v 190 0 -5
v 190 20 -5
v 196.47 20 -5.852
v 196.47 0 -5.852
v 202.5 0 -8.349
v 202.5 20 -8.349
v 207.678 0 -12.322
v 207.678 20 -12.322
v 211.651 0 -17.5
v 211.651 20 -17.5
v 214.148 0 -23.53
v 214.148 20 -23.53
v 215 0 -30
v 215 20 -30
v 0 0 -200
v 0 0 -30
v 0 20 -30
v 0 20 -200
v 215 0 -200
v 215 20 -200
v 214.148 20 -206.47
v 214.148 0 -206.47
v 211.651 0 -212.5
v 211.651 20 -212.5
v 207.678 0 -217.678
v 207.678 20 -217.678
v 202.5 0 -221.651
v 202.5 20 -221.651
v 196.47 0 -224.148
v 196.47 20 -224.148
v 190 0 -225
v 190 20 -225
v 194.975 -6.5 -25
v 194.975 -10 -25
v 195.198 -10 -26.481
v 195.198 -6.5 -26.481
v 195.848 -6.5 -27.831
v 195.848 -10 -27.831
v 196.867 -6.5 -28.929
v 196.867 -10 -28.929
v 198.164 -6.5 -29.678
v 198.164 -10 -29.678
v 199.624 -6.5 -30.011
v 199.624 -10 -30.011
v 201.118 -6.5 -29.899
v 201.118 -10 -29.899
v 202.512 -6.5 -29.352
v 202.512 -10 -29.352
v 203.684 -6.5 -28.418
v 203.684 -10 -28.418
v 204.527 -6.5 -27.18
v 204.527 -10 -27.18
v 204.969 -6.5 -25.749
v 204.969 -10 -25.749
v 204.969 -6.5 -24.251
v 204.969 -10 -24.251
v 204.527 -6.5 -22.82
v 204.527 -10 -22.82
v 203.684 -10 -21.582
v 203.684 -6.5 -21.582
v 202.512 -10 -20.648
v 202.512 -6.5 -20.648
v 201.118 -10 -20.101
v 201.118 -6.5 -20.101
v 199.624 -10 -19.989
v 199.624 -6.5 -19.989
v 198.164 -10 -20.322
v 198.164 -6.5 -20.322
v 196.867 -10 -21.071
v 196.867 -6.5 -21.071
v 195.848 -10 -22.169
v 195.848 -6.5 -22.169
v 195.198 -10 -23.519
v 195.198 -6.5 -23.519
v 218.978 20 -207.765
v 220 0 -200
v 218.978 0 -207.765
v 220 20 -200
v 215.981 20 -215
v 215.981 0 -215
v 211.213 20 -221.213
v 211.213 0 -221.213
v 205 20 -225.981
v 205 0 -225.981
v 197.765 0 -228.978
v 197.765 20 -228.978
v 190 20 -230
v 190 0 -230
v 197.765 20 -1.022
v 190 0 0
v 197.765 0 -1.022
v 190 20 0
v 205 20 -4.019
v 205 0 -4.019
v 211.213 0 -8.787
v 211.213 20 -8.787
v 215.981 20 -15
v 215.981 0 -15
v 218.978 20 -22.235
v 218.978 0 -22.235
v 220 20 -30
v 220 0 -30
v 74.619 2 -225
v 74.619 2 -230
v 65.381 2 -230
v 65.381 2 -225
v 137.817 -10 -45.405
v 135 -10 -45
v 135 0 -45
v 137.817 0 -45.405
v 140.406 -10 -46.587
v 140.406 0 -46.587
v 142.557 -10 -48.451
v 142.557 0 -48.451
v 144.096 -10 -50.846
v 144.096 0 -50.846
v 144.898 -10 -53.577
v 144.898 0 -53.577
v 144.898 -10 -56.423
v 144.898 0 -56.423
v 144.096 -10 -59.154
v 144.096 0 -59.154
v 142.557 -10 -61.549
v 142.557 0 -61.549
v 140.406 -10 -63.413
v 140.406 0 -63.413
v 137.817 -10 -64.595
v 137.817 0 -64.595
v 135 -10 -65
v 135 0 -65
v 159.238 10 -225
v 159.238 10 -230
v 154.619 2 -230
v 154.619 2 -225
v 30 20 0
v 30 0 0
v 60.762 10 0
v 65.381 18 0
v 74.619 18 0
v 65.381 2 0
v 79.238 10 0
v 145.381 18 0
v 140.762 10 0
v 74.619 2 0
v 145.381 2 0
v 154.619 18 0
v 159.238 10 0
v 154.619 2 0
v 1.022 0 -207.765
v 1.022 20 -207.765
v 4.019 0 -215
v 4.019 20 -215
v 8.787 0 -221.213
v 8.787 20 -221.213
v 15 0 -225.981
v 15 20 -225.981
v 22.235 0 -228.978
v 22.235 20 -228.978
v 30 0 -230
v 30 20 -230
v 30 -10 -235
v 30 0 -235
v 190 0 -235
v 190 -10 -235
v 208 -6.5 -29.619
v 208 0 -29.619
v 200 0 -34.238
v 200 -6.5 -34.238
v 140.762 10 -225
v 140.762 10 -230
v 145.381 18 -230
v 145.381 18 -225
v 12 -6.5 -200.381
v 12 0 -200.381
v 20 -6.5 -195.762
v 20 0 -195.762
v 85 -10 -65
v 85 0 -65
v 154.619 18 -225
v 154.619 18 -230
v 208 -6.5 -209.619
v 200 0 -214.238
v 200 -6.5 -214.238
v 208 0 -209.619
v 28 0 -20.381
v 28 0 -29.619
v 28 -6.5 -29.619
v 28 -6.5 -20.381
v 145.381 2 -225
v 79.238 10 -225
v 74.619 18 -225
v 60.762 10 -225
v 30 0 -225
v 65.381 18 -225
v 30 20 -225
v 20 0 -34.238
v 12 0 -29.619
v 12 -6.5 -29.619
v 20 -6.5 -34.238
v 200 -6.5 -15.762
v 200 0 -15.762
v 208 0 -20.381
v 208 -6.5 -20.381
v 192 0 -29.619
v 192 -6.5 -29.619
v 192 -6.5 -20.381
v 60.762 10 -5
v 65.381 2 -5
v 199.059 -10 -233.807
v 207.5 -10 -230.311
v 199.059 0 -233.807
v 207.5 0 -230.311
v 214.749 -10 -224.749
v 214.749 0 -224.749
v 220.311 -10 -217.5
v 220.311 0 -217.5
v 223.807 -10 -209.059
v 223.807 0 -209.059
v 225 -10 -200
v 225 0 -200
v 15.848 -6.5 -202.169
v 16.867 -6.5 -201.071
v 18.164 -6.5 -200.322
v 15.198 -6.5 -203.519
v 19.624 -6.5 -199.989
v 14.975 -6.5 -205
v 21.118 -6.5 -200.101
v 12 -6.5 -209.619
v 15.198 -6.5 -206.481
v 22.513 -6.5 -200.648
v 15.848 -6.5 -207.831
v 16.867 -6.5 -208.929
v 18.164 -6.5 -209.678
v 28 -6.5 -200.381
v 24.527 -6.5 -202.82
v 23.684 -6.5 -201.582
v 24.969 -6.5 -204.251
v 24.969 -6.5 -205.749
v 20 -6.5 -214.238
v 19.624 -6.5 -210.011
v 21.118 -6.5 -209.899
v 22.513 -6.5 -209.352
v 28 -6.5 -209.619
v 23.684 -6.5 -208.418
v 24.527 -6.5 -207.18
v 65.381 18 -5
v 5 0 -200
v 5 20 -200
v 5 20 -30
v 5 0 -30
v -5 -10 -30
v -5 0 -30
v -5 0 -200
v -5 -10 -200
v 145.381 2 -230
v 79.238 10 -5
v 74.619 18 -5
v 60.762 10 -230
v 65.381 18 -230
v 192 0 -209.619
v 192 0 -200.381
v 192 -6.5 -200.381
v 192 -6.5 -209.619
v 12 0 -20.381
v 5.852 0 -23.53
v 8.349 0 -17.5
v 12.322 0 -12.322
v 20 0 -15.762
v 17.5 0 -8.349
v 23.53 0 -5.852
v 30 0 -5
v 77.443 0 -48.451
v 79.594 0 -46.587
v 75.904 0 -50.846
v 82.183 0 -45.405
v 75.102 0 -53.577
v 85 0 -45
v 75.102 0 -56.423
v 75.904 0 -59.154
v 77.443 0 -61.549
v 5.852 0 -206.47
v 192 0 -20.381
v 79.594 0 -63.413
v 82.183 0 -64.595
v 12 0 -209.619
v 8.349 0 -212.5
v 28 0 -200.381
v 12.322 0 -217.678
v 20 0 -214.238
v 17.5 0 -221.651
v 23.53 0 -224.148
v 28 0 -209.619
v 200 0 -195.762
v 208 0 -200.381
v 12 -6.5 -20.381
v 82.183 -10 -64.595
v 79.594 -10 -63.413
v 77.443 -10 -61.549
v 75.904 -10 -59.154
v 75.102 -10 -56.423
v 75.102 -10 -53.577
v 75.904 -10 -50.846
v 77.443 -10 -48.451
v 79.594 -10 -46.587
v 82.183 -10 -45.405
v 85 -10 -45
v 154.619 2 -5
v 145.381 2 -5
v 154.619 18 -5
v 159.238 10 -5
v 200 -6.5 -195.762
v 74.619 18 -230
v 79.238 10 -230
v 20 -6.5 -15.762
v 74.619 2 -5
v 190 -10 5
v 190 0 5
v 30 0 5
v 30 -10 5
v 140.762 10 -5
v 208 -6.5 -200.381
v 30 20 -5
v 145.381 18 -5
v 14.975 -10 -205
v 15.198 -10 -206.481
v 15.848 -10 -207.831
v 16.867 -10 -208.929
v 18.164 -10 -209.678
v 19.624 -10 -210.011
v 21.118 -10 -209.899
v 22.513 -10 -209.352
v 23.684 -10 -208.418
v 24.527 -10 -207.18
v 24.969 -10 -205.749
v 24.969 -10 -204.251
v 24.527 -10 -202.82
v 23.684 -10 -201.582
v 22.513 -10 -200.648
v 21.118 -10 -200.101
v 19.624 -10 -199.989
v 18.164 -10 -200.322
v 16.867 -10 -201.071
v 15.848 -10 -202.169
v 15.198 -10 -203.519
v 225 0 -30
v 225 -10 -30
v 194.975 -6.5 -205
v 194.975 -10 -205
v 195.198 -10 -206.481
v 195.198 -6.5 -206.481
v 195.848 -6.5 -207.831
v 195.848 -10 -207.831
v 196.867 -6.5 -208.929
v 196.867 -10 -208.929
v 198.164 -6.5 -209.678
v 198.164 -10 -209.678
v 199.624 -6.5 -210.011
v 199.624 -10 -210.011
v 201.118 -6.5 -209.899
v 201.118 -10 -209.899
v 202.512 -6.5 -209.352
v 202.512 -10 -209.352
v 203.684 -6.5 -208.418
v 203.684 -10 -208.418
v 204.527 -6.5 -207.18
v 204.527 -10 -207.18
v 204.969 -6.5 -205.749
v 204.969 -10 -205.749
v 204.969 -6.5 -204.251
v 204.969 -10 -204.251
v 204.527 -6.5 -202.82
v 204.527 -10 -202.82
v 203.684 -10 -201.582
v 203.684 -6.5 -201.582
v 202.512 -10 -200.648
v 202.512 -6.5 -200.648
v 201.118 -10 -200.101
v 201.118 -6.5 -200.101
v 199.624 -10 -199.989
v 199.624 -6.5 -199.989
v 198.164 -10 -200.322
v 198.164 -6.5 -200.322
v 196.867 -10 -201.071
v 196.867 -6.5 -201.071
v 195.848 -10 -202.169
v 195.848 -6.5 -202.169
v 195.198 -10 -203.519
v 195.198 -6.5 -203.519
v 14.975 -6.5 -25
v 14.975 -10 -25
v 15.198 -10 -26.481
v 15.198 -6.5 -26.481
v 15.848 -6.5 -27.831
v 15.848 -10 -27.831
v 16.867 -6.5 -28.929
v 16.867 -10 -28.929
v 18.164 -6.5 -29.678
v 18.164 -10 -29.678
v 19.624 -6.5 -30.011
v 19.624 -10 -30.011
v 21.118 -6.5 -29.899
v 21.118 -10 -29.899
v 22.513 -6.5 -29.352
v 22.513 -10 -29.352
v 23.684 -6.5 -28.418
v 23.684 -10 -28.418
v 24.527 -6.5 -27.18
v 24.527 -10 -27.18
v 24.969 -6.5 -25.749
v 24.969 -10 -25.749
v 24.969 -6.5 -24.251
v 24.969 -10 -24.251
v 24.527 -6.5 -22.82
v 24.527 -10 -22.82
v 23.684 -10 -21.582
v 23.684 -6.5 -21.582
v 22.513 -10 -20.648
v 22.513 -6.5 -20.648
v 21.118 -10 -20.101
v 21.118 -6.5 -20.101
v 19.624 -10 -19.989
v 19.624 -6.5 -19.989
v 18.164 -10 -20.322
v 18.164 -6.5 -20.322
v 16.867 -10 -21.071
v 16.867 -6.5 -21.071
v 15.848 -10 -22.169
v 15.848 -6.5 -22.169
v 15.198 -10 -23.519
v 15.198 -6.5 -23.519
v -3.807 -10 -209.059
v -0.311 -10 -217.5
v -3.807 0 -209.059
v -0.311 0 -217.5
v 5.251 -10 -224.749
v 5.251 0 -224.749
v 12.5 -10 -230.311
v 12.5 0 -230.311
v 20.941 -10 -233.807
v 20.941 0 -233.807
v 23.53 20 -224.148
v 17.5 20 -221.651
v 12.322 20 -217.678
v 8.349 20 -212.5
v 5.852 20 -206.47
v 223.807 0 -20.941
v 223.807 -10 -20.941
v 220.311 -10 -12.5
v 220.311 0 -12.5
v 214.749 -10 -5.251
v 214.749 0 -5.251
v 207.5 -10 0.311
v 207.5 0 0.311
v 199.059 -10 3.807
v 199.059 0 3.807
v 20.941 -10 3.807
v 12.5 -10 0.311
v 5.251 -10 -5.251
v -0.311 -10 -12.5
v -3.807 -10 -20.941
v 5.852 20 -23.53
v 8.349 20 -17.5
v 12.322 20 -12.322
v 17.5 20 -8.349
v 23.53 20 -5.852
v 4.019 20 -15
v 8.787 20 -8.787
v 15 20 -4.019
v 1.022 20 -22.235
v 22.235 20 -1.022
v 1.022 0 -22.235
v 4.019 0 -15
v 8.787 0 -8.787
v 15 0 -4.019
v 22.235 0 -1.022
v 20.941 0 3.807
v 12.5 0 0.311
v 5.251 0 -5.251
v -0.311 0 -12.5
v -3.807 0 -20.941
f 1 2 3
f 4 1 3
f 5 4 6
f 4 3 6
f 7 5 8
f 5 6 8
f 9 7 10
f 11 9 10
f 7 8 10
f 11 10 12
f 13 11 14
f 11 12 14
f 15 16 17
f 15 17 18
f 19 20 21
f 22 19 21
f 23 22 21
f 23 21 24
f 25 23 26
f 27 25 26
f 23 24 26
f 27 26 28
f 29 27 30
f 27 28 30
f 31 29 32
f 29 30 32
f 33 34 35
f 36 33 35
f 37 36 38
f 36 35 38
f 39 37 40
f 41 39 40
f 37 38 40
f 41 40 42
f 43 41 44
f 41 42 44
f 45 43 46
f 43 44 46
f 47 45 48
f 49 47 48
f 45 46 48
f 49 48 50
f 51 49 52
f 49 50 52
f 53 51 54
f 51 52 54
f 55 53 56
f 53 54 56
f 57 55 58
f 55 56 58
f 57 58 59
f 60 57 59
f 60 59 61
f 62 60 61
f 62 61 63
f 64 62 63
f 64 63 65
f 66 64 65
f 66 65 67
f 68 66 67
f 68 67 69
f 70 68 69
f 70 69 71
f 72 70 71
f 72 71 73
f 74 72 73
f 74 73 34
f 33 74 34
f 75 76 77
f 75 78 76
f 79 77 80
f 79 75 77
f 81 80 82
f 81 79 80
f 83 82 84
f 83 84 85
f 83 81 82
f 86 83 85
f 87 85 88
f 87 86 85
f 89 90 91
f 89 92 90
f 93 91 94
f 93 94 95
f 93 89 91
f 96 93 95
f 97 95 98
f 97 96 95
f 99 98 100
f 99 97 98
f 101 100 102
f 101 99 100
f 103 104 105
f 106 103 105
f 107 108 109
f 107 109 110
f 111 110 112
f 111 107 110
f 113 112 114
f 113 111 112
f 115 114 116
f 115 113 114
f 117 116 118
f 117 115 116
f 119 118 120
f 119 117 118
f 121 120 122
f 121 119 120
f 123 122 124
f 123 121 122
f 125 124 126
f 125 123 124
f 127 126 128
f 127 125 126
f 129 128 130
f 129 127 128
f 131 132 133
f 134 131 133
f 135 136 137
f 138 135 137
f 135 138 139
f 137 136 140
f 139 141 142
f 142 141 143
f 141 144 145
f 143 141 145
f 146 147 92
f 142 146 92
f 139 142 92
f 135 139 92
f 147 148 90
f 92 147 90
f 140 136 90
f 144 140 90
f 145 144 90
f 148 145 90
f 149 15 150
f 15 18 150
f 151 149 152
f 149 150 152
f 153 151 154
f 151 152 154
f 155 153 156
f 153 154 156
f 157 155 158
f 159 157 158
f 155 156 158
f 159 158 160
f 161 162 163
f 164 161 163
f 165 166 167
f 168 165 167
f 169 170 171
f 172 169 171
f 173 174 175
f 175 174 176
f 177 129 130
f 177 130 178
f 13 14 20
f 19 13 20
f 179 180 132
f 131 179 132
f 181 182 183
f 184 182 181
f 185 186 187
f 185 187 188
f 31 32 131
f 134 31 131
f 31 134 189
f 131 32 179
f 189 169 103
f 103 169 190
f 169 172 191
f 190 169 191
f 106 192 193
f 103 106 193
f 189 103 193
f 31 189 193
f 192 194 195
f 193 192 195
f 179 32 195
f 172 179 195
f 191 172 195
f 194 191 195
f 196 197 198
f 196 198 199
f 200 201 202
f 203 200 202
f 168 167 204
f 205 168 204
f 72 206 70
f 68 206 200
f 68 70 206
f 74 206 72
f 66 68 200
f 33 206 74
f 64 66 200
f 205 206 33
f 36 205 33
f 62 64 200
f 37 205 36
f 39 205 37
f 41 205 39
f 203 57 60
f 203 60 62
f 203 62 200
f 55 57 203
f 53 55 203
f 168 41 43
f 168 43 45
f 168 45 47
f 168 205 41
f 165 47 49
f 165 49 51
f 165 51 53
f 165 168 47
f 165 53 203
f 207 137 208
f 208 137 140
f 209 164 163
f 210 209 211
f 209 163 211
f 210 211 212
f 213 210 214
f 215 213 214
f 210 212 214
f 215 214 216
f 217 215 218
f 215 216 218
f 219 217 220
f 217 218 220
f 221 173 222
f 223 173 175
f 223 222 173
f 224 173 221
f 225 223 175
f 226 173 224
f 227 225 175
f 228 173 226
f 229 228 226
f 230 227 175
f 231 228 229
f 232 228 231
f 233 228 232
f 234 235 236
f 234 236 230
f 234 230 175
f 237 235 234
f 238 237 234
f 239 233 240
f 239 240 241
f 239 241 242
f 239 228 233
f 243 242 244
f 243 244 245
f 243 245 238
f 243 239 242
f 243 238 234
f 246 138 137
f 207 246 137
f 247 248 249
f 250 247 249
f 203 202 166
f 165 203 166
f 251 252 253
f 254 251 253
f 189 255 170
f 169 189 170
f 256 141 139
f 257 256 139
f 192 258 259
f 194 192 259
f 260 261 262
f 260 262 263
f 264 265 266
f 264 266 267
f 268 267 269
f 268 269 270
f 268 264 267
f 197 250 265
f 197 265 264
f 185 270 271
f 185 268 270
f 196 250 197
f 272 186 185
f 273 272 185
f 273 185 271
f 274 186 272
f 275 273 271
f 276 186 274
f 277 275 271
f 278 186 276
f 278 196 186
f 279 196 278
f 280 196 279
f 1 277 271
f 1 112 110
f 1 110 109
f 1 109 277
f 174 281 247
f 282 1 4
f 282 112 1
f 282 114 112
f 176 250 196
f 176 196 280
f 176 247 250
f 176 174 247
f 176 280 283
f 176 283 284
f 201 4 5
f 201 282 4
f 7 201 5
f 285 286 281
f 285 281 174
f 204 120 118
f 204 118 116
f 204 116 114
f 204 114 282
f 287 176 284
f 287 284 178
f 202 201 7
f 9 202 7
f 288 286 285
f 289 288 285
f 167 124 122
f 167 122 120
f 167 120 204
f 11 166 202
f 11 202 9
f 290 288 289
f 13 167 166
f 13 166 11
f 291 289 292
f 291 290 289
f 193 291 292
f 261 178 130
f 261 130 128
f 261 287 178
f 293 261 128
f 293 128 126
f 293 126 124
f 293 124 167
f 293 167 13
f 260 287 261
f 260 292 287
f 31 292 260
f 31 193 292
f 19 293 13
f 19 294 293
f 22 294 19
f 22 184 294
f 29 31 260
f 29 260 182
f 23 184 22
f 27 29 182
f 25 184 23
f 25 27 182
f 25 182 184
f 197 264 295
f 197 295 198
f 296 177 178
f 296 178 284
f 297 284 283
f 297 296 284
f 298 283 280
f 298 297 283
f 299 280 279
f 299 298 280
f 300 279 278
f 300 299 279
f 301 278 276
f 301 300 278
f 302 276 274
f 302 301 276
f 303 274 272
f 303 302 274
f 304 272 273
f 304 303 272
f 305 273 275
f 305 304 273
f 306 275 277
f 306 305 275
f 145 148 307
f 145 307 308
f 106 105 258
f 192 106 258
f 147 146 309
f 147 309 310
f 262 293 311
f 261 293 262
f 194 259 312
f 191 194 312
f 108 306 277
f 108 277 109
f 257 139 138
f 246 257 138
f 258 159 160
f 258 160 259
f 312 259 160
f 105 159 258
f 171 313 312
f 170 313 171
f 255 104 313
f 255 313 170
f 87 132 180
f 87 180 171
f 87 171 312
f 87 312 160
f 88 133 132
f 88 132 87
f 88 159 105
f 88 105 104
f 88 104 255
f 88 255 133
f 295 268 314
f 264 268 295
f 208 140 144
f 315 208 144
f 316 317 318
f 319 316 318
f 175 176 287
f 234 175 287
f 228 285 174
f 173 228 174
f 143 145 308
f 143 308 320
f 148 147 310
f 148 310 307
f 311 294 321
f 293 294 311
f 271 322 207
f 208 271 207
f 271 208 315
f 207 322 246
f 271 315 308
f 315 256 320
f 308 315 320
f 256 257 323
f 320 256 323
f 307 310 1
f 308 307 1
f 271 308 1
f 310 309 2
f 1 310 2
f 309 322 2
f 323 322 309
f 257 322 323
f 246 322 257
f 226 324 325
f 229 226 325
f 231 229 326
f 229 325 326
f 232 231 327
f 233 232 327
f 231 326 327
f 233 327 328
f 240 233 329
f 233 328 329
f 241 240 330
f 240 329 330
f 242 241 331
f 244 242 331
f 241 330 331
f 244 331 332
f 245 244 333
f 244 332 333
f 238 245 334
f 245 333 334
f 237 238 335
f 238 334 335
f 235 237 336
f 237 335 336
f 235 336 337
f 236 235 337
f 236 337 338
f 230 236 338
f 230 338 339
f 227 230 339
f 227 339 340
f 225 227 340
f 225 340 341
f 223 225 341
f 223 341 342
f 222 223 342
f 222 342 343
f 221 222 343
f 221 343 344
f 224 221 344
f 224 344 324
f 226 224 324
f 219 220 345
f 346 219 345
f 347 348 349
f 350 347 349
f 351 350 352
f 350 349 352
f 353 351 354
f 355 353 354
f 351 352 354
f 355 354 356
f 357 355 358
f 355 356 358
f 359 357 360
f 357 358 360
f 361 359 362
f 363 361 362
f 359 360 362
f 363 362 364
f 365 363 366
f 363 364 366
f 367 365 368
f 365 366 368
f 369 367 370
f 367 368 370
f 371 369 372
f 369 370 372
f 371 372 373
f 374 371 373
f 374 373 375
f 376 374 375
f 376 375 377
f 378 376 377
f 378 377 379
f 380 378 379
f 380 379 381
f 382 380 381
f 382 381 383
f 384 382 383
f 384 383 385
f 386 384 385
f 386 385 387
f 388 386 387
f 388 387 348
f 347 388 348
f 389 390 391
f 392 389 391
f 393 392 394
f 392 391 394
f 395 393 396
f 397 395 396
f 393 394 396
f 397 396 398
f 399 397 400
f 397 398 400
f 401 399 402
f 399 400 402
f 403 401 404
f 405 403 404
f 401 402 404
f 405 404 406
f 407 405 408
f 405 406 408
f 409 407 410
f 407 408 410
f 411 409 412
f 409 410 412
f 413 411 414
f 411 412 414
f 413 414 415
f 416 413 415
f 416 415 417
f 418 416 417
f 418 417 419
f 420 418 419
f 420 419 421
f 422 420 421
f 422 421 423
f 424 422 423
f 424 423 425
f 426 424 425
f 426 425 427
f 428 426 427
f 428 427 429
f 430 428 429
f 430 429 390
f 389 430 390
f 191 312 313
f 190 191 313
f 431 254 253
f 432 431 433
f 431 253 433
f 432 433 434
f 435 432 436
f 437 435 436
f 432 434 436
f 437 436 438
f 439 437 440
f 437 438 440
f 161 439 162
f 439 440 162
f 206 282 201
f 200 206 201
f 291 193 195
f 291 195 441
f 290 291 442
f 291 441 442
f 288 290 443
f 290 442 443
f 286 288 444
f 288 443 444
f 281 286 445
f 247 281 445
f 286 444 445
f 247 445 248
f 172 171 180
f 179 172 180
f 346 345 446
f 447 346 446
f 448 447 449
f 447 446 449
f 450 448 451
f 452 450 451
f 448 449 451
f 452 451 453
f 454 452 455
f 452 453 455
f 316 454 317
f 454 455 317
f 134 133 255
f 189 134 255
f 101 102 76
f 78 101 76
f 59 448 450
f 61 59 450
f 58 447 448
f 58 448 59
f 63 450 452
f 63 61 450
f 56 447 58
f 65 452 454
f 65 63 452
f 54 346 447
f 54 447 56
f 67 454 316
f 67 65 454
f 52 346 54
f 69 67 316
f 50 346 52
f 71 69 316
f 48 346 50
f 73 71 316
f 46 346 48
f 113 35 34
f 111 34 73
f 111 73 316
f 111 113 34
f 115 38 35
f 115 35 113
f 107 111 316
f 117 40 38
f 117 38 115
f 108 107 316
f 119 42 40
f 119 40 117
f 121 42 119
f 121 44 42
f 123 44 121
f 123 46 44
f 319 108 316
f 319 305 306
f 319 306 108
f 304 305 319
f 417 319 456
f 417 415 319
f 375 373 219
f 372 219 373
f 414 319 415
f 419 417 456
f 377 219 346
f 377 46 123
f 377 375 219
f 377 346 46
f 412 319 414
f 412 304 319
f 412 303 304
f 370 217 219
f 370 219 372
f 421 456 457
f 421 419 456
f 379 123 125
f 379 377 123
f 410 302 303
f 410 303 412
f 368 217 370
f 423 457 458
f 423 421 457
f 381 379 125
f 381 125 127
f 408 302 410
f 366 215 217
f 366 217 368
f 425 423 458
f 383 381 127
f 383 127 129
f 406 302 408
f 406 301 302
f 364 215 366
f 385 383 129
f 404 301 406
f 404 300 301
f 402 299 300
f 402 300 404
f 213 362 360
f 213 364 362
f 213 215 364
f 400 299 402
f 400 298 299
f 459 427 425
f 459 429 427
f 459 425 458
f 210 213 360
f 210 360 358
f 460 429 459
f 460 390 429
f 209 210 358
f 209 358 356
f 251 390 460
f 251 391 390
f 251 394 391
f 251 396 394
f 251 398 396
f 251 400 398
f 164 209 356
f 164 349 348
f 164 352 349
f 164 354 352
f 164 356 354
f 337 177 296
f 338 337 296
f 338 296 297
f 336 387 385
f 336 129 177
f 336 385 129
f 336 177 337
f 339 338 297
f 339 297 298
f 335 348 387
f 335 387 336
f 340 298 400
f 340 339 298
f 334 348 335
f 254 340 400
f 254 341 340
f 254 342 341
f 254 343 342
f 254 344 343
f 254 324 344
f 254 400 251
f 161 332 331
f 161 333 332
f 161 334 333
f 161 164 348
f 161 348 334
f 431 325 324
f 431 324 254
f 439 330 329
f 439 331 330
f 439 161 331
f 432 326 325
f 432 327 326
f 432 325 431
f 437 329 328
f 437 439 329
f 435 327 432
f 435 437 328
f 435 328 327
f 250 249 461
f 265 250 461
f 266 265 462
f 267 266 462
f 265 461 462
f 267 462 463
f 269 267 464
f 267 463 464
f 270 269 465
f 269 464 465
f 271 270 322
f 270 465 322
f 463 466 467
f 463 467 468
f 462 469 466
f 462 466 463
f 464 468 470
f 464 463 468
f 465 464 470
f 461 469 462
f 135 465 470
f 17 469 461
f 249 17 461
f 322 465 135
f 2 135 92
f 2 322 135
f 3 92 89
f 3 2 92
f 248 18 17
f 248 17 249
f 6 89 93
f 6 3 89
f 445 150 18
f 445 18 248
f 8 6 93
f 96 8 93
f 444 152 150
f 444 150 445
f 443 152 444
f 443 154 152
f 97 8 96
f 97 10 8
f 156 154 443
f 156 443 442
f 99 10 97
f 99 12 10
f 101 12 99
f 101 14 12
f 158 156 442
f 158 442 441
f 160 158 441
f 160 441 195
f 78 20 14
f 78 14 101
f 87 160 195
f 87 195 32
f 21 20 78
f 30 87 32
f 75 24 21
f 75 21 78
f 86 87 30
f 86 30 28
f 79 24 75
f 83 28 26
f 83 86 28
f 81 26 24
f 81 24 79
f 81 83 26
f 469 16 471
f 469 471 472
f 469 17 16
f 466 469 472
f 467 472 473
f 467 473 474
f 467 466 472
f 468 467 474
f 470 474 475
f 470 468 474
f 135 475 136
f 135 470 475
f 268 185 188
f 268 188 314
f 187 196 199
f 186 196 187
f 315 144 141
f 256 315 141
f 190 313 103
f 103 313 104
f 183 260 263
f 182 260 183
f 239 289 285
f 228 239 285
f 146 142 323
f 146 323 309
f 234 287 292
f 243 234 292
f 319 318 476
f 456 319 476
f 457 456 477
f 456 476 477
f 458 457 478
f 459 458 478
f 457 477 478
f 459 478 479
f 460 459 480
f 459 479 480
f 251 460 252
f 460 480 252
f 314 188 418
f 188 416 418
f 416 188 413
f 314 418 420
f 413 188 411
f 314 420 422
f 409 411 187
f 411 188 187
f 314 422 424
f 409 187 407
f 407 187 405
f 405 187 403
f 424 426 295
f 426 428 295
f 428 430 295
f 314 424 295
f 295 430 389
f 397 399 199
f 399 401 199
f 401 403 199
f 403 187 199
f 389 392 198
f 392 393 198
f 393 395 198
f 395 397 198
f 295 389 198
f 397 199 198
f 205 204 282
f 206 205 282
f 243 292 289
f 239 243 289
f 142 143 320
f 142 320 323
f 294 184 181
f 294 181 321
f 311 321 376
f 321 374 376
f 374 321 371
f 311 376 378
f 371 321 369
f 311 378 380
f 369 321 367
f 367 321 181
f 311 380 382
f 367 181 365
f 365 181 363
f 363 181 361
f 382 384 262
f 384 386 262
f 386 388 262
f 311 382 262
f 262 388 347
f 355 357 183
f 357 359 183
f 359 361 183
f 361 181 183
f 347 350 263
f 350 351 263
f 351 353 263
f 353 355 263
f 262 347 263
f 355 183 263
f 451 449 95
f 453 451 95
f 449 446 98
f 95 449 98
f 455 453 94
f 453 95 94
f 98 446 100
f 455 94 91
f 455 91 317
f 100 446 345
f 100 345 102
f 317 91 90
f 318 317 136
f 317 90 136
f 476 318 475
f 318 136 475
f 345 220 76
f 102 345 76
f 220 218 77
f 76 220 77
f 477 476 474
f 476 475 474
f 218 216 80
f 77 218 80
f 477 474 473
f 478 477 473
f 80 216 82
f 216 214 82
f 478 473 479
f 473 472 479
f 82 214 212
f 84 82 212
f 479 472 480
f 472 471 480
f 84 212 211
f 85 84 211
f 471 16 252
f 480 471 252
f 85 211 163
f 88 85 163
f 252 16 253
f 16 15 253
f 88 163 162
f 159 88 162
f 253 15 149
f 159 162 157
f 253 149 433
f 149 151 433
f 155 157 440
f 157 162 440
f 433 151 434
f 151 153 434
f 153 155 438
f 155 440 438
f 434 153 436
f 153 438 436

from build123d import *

# Parameters (mm, degrees)
SKETCH1_W           = 220
SKETCH1_H           = 230
BOSS_EXTRUDE1_DEPTH = 20
FILLET1_R           = 30
BOSS_EXTRUDE4_DEPTH = 10
CUT_EXTRUDE10_DEPTH = 20
SKETCH6_R           = 5.025
CUT_EXTRUDE3_DEPTH  = 31
SKETCH8_R           = 5
CUT_EXTRUDE4_DEPTH  = 30
SKETCH7_R           = 5
CUT_EXTRUDE5_DEPTH  = 30
CUT_EXTRUDE6_DEPTH  = 8.5
CUT_EXTRUDE7_DEPTH  = 8.5
CUT_EXTRUDE8_DEPTH  = 26.5
CUT_EXTRUDE9_DEPTH  = 31


with BuildPart() as part:
    # Sketch1 → Boss-Extrude1 (new body)
    with BuildSketch(Plane(origin=(0, 0, 0), x_dir=(1, 0, 0), z_dir=(0, 1, 0))):
        with Locations((110, 115)):
            Rectangle(SKETCH1_W, SKETCH1_H)
    extrude(amount=BOSS_EXTRUDE1_DEPTH)

    # Fillet1
    fillet1_edges = [part.edges().sort_by_distance(p)[0] for p in [
        (0, 10, -230),
        (220, 10, -230),
        (220, 10, 0),
        (0, 10, 0),
    ]]
    fillet(fillet1_edges, radius=FILLET1_R)

    # Sketch4 → Boss-Extrude4 (add)
    with BuildSketch(Plane(origin=(0, 0, 0), x_dir=(-1, 0, 0), z_dir=(0, -1, 0))):
        with BuildLine():
            Line((-225, 200), (-225, 30))
            ThreePointArc((-225, 30), (-214.748737342, 5.251262658), (-190, -5))
            Line((-190, -5), (-30, -5))
            ThreePointArc((-30, -5), (-5.251262658, 5.251262658), (5, 30))
            Line((5, 30), (5, 200))
            ThreePointArc((5, 200), (-5.251262658, 224.748737342), (-30, 235))
            Line((-30, 235), (-190, 235))
            ThreePointArc((-190, 235), (-214.748737342, 224.748737342), (-225, 200))
        make_face()
    extrude(amount=BOSS_EXTRUDE4_DEPTH)

    # Sketch15 → Cut-Extrude10 (cut)
    with BuildSketch(Plane(origin=(0, 20, 0), x_dir=(1, 0, 0), z_dir=(0, 1, 0))):
        with BuildLine():
            Line((215, 30), (215, 200))
            ThreePointArc((215, 200), (207.67766953, 217.67766953), (190, 225))
            Line((190, 225), (30, 225))
            ThreePointArc((30, 225), (12.32233047, 217.67766953), (5, 200))
            Line((5, 200), (5, 30))
            ThreePointArc((5, 30), (12.32233047, 12.32233047), (30, 5))
            Line((30, 5), (190, 5))
            ThreePointArc((190, 5), (207.67766953, 12.32233047), (215, 30))
        make_face()
    extrude(amount=-CUT_EXTRUDE10_DEPTH, mode=Mode.SUBTRACT)

    # Sketch6 → Cut-Extrude3 (cut, through all)
    with BuildSketch(Plane(origin=(0, -10, 0), x_dir=(-1, 0, 0), z_dir=(0, -1, 0))):
        with Locations((-200, 205)):
            Circle(SKETCH6_R)
        with Locations((-20, 205)):
            Circle(SKETCH6_R)
        with Locations((-20, 25)):
            Circle(SKETCH6_R)
        with Locations((-200, 25)):
            Circle(SKETCH6_R)
    extrude(amount=-CUT_EXTRUDE3_DEPTH, mode=Mode.SUBTRACT)

    # Sketch8 → Cut-Extrude4 (cut)
    with BuildSketch(Plane(origin=(0, 0, -230), x_dir=(-1, 0, 0), z_dir=(0, 0, -1))):
        with Locations((-150, 10)):
            Circle(SKETCH8_R)
        with Locations((-70, 10)):
            Circle(SKETCH8_R)
    extrude(amount=-CUT_EXTRUDE4_DEPTH, mode=Mode.SUBTRACT)

    # Sketch7 → Cut-Extrude5 (cut)
    with BuildSketch(Plane.XY):
        with Locations((70, 10)):
            Circle(SKETCH7_R)
        with Locations((150, 10)):
            Circle(SKETCH7_R)
    extrude(amount=-CUT_EXTRUDE5_DEPTH, mode=Mode.SUBTRACT)

    # Sketch10 → Cut-Extrude6 (cut)
    with BuildSketch(Plane(origin=(0, 0, -230), x_dir=(-1, 0, 0), z_dir=(0, 0, -1))):
        Polygon((-159.237604307, 10), (-154.618802154, 2), (-145.381197846, 2), (-140.762395693, 10), (-145.381197846, 18), (-154.618802154, 18), align=None)
        Polygon((-79.237604307, 10), (-74.618802154, 2), (-65.381197846, 2), (-60.762395693, 10), (-65.381197846, 18), (-74.618802154, 18), align=None)
    extrude(amount=-CUT_EXTRUDE6_DEPTH, mode=Mode.SUBTRACT)

    # Sketch9 → Cut-Extrude7 (cut)
    with BuildSketch(Plane.XY):
        Polygon((60.762395693, 10), (65.381197846, 2), (74.618802154, 2), (79.237604307, 10), (74.618802154, 18), (65.381197846, 18), align=None)
        Polygon((154.618802154, 2), (145.381197846, 2), (140.762395693, 10), (145.381197846, 18), (154.618802154, 18), (159.237604307, 10), align=None)
    extrude(amount=-CUT_EXTRUDE7_DEPTH, mode=Mode.SUBTRACT)

    # Sketch11 → Cut-Extrude8 (cut)
    with BuildSketch(Plane(origin=(0, 20, 0), x_dir=(1, 0, 0), z_dir=(0, 1, 0))):
        Polygon((20, 214.237604307), (12, 209.618802154), (12, 200.381197846), (20, 195.762395693), (28, 200.381197846), (28, 209.618802154), align=None)
        Polygon((192, 209.618802154), (200, 214.237604307), (208, 209.618802154), (208, 200.381197846), (200, 195.762395693), (192, 200.381197846), align=None)
        Polygon((192, 29.618802154), (192, 20.381197846), (200, 15.762395693), (208, 20.381197846), (208, 29.618802154), (200, 34.237604307), align=None)
        Polygon((28, 20.381197846), (20, 15.762395693), (12, 20.381197846), (12, 29.618802154), (20, 34.237604307), (28, 29.618802154), align=None)
    extrude(amount=-CUT_EXTRUDE8_DEPTH, mode=Mode.SUBTRACT)

    # Sketch13 → Cut-Extrude9 (cut, through all)
    with BuildSketch(Plane.XZ.offset(10)):
        with BuildLine():
            Line((135, -65), (85, -65))
            ThreePointArc((85, -65), (75, -55), (85, -45))
            Line((85, -45), (135, -45))
            ThreePointArc((135, -45), (145, -55), (135, -65))
        make_face()
    extrude(amount=-CUT_EXTRUDE9_DEPTH, mode=Mode.SUBTRACT)


solid = part.part
